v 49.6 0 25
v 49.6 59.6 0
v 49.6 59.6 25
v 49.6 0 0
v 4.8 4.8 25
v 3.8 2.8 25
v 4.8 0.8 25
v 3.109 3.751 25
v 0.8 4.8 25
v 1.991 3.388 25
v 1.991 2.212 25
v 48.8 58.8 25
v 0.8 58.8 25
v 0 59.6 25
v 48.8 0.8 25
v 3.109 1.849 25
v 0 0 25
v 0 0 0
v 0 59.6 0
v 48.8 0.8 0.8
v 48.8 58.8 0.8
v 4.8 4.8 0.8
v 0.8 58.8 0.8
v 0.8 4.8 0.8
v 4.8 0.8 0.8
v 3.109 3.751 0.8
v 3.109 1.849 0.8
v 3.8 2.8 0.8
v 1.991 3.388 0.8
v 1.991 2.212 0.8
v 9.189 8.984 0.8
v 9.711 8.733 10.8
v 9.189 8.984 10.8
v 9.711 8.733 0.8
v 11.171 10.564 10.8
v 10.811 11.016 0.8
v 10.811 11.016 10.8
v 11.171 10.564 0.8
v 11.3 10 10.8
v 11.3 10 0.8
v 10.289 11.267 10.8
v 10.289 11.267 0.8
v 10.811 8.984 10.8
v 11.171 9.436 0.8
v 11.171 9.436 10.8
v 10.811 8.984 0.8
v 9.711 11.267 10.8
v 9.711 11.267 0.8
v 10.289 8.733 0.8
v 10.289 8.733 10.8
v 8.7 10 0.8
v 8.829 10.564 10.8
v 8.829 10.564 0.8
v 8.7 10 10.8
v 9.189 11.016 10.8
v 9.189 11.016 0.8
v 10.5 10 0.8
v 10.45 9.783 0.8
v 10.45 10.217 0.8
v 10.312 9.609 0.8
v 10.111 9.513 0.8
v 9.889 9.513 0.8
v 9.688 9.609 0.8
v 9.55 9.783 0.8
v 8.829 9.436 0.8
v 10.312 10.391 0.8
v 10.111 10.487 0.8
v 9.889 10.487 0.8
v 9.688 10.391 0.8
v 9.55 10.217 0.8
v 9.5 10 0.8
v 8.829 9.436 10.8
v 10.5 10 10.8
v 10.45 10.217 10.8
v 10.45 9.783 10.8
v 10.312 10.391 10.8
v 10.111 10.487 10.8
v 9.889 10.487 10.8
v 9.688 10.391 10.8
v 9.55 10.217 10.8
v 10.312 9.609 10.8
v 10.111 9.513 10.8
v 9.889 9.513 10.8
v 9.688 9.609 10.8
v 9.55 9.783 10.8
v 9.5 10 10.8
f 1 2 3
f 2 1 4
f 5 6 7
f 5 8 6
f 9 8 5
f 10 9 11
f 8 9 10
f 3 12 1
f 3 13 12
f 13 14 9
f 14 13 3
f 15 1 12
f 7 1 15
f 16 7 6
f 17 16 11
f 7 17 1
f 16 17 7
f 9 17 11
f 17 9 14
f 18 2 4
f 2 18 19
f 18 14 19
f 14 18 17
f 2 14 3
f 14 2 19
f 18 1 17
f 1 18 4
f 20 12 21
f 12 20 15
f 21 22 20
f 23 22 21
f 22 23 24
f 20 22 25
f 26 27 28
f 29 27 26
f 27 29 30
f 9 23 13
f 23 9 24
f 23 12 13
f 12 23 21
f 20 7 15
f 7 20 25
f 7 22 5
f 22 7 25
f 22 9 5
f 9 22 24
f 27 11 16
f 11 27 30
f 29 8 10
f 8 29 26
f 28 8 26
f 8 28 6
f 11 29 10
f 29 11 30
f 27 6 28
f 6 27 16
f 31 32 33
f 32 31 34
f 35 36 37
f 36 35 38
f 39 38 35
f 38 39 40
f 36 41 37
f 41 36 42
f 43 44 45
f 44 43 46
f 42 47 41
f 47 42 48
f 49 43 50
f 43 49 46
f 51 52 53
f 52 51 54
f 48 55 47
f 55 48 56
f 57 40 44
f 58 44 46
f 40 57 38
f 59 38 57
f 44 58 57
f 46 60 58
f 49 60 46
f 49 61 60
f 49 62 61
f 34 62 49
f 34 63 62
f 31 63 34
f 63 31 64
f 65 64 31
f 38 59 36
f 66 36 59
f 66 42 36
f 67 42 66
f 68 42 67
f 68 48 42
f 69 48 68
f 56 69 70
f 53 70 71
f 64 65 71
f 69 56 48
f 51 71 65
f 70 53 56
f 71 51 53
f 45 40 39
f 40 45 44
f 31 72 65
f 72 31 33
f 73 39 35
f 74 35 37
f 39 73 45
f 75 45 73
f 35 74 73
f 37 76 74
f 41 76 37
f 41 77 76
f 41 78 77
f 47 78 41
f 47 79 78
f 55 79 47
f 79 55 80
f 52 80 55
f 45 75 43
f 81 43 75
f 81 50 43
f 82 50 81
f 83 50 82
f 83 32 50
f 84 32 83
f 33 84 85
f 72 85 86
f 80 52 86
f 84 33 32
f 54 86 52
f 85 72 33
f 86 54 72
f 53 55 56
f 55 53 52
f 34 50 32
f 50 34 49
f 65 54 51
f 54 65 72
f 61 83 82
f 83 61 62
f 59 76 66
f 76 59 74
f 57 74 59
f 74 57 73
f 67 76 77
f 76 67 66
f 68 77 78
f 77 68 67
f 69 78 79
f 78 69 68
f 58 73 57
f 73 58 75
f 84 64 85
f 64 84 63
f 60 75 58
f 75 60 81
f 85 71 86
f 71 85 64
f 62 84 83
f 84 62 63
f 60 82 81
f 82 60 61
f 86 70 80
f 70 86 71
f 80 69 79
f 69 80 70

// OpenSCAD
width=40;
length=50;
height=25;
w = 2*0.4;
corner_width=4;


bottom_body();
screew_mounting();

module screew_mounting()
{
    d = 1;
    h = 10;
    translate([10, 10, w])
    difference()
    {        
        cylinder(d=d+2*w, h=h,$fn=14);
        #cylinder(d=d, h=h,$fn=14);
    }
}



module bottom_body()
{
    outer_case(width + 2*corner_width, length  + 2*corner_width, height);
    corner();
}

// TODO: POSTPONED
module corner()
{
    width=corner_width;
    difference()
    {
        translate([w,w,w])
        cube([width, width, height-w]);
        translate([width/2+w,width/2+w,w])
        #cylinder(d=2,h=height);
    }
}


module outer_case(width, length, height)
{
    difference()
    {
        case_cube(width, length, height, w=2*w);
        translate([w,w,w])
        case_cube(width, length, height);
    }
}

module case_cube(width, length, height, w=0)
{
    cube([width+w, length+w,height]);
}
